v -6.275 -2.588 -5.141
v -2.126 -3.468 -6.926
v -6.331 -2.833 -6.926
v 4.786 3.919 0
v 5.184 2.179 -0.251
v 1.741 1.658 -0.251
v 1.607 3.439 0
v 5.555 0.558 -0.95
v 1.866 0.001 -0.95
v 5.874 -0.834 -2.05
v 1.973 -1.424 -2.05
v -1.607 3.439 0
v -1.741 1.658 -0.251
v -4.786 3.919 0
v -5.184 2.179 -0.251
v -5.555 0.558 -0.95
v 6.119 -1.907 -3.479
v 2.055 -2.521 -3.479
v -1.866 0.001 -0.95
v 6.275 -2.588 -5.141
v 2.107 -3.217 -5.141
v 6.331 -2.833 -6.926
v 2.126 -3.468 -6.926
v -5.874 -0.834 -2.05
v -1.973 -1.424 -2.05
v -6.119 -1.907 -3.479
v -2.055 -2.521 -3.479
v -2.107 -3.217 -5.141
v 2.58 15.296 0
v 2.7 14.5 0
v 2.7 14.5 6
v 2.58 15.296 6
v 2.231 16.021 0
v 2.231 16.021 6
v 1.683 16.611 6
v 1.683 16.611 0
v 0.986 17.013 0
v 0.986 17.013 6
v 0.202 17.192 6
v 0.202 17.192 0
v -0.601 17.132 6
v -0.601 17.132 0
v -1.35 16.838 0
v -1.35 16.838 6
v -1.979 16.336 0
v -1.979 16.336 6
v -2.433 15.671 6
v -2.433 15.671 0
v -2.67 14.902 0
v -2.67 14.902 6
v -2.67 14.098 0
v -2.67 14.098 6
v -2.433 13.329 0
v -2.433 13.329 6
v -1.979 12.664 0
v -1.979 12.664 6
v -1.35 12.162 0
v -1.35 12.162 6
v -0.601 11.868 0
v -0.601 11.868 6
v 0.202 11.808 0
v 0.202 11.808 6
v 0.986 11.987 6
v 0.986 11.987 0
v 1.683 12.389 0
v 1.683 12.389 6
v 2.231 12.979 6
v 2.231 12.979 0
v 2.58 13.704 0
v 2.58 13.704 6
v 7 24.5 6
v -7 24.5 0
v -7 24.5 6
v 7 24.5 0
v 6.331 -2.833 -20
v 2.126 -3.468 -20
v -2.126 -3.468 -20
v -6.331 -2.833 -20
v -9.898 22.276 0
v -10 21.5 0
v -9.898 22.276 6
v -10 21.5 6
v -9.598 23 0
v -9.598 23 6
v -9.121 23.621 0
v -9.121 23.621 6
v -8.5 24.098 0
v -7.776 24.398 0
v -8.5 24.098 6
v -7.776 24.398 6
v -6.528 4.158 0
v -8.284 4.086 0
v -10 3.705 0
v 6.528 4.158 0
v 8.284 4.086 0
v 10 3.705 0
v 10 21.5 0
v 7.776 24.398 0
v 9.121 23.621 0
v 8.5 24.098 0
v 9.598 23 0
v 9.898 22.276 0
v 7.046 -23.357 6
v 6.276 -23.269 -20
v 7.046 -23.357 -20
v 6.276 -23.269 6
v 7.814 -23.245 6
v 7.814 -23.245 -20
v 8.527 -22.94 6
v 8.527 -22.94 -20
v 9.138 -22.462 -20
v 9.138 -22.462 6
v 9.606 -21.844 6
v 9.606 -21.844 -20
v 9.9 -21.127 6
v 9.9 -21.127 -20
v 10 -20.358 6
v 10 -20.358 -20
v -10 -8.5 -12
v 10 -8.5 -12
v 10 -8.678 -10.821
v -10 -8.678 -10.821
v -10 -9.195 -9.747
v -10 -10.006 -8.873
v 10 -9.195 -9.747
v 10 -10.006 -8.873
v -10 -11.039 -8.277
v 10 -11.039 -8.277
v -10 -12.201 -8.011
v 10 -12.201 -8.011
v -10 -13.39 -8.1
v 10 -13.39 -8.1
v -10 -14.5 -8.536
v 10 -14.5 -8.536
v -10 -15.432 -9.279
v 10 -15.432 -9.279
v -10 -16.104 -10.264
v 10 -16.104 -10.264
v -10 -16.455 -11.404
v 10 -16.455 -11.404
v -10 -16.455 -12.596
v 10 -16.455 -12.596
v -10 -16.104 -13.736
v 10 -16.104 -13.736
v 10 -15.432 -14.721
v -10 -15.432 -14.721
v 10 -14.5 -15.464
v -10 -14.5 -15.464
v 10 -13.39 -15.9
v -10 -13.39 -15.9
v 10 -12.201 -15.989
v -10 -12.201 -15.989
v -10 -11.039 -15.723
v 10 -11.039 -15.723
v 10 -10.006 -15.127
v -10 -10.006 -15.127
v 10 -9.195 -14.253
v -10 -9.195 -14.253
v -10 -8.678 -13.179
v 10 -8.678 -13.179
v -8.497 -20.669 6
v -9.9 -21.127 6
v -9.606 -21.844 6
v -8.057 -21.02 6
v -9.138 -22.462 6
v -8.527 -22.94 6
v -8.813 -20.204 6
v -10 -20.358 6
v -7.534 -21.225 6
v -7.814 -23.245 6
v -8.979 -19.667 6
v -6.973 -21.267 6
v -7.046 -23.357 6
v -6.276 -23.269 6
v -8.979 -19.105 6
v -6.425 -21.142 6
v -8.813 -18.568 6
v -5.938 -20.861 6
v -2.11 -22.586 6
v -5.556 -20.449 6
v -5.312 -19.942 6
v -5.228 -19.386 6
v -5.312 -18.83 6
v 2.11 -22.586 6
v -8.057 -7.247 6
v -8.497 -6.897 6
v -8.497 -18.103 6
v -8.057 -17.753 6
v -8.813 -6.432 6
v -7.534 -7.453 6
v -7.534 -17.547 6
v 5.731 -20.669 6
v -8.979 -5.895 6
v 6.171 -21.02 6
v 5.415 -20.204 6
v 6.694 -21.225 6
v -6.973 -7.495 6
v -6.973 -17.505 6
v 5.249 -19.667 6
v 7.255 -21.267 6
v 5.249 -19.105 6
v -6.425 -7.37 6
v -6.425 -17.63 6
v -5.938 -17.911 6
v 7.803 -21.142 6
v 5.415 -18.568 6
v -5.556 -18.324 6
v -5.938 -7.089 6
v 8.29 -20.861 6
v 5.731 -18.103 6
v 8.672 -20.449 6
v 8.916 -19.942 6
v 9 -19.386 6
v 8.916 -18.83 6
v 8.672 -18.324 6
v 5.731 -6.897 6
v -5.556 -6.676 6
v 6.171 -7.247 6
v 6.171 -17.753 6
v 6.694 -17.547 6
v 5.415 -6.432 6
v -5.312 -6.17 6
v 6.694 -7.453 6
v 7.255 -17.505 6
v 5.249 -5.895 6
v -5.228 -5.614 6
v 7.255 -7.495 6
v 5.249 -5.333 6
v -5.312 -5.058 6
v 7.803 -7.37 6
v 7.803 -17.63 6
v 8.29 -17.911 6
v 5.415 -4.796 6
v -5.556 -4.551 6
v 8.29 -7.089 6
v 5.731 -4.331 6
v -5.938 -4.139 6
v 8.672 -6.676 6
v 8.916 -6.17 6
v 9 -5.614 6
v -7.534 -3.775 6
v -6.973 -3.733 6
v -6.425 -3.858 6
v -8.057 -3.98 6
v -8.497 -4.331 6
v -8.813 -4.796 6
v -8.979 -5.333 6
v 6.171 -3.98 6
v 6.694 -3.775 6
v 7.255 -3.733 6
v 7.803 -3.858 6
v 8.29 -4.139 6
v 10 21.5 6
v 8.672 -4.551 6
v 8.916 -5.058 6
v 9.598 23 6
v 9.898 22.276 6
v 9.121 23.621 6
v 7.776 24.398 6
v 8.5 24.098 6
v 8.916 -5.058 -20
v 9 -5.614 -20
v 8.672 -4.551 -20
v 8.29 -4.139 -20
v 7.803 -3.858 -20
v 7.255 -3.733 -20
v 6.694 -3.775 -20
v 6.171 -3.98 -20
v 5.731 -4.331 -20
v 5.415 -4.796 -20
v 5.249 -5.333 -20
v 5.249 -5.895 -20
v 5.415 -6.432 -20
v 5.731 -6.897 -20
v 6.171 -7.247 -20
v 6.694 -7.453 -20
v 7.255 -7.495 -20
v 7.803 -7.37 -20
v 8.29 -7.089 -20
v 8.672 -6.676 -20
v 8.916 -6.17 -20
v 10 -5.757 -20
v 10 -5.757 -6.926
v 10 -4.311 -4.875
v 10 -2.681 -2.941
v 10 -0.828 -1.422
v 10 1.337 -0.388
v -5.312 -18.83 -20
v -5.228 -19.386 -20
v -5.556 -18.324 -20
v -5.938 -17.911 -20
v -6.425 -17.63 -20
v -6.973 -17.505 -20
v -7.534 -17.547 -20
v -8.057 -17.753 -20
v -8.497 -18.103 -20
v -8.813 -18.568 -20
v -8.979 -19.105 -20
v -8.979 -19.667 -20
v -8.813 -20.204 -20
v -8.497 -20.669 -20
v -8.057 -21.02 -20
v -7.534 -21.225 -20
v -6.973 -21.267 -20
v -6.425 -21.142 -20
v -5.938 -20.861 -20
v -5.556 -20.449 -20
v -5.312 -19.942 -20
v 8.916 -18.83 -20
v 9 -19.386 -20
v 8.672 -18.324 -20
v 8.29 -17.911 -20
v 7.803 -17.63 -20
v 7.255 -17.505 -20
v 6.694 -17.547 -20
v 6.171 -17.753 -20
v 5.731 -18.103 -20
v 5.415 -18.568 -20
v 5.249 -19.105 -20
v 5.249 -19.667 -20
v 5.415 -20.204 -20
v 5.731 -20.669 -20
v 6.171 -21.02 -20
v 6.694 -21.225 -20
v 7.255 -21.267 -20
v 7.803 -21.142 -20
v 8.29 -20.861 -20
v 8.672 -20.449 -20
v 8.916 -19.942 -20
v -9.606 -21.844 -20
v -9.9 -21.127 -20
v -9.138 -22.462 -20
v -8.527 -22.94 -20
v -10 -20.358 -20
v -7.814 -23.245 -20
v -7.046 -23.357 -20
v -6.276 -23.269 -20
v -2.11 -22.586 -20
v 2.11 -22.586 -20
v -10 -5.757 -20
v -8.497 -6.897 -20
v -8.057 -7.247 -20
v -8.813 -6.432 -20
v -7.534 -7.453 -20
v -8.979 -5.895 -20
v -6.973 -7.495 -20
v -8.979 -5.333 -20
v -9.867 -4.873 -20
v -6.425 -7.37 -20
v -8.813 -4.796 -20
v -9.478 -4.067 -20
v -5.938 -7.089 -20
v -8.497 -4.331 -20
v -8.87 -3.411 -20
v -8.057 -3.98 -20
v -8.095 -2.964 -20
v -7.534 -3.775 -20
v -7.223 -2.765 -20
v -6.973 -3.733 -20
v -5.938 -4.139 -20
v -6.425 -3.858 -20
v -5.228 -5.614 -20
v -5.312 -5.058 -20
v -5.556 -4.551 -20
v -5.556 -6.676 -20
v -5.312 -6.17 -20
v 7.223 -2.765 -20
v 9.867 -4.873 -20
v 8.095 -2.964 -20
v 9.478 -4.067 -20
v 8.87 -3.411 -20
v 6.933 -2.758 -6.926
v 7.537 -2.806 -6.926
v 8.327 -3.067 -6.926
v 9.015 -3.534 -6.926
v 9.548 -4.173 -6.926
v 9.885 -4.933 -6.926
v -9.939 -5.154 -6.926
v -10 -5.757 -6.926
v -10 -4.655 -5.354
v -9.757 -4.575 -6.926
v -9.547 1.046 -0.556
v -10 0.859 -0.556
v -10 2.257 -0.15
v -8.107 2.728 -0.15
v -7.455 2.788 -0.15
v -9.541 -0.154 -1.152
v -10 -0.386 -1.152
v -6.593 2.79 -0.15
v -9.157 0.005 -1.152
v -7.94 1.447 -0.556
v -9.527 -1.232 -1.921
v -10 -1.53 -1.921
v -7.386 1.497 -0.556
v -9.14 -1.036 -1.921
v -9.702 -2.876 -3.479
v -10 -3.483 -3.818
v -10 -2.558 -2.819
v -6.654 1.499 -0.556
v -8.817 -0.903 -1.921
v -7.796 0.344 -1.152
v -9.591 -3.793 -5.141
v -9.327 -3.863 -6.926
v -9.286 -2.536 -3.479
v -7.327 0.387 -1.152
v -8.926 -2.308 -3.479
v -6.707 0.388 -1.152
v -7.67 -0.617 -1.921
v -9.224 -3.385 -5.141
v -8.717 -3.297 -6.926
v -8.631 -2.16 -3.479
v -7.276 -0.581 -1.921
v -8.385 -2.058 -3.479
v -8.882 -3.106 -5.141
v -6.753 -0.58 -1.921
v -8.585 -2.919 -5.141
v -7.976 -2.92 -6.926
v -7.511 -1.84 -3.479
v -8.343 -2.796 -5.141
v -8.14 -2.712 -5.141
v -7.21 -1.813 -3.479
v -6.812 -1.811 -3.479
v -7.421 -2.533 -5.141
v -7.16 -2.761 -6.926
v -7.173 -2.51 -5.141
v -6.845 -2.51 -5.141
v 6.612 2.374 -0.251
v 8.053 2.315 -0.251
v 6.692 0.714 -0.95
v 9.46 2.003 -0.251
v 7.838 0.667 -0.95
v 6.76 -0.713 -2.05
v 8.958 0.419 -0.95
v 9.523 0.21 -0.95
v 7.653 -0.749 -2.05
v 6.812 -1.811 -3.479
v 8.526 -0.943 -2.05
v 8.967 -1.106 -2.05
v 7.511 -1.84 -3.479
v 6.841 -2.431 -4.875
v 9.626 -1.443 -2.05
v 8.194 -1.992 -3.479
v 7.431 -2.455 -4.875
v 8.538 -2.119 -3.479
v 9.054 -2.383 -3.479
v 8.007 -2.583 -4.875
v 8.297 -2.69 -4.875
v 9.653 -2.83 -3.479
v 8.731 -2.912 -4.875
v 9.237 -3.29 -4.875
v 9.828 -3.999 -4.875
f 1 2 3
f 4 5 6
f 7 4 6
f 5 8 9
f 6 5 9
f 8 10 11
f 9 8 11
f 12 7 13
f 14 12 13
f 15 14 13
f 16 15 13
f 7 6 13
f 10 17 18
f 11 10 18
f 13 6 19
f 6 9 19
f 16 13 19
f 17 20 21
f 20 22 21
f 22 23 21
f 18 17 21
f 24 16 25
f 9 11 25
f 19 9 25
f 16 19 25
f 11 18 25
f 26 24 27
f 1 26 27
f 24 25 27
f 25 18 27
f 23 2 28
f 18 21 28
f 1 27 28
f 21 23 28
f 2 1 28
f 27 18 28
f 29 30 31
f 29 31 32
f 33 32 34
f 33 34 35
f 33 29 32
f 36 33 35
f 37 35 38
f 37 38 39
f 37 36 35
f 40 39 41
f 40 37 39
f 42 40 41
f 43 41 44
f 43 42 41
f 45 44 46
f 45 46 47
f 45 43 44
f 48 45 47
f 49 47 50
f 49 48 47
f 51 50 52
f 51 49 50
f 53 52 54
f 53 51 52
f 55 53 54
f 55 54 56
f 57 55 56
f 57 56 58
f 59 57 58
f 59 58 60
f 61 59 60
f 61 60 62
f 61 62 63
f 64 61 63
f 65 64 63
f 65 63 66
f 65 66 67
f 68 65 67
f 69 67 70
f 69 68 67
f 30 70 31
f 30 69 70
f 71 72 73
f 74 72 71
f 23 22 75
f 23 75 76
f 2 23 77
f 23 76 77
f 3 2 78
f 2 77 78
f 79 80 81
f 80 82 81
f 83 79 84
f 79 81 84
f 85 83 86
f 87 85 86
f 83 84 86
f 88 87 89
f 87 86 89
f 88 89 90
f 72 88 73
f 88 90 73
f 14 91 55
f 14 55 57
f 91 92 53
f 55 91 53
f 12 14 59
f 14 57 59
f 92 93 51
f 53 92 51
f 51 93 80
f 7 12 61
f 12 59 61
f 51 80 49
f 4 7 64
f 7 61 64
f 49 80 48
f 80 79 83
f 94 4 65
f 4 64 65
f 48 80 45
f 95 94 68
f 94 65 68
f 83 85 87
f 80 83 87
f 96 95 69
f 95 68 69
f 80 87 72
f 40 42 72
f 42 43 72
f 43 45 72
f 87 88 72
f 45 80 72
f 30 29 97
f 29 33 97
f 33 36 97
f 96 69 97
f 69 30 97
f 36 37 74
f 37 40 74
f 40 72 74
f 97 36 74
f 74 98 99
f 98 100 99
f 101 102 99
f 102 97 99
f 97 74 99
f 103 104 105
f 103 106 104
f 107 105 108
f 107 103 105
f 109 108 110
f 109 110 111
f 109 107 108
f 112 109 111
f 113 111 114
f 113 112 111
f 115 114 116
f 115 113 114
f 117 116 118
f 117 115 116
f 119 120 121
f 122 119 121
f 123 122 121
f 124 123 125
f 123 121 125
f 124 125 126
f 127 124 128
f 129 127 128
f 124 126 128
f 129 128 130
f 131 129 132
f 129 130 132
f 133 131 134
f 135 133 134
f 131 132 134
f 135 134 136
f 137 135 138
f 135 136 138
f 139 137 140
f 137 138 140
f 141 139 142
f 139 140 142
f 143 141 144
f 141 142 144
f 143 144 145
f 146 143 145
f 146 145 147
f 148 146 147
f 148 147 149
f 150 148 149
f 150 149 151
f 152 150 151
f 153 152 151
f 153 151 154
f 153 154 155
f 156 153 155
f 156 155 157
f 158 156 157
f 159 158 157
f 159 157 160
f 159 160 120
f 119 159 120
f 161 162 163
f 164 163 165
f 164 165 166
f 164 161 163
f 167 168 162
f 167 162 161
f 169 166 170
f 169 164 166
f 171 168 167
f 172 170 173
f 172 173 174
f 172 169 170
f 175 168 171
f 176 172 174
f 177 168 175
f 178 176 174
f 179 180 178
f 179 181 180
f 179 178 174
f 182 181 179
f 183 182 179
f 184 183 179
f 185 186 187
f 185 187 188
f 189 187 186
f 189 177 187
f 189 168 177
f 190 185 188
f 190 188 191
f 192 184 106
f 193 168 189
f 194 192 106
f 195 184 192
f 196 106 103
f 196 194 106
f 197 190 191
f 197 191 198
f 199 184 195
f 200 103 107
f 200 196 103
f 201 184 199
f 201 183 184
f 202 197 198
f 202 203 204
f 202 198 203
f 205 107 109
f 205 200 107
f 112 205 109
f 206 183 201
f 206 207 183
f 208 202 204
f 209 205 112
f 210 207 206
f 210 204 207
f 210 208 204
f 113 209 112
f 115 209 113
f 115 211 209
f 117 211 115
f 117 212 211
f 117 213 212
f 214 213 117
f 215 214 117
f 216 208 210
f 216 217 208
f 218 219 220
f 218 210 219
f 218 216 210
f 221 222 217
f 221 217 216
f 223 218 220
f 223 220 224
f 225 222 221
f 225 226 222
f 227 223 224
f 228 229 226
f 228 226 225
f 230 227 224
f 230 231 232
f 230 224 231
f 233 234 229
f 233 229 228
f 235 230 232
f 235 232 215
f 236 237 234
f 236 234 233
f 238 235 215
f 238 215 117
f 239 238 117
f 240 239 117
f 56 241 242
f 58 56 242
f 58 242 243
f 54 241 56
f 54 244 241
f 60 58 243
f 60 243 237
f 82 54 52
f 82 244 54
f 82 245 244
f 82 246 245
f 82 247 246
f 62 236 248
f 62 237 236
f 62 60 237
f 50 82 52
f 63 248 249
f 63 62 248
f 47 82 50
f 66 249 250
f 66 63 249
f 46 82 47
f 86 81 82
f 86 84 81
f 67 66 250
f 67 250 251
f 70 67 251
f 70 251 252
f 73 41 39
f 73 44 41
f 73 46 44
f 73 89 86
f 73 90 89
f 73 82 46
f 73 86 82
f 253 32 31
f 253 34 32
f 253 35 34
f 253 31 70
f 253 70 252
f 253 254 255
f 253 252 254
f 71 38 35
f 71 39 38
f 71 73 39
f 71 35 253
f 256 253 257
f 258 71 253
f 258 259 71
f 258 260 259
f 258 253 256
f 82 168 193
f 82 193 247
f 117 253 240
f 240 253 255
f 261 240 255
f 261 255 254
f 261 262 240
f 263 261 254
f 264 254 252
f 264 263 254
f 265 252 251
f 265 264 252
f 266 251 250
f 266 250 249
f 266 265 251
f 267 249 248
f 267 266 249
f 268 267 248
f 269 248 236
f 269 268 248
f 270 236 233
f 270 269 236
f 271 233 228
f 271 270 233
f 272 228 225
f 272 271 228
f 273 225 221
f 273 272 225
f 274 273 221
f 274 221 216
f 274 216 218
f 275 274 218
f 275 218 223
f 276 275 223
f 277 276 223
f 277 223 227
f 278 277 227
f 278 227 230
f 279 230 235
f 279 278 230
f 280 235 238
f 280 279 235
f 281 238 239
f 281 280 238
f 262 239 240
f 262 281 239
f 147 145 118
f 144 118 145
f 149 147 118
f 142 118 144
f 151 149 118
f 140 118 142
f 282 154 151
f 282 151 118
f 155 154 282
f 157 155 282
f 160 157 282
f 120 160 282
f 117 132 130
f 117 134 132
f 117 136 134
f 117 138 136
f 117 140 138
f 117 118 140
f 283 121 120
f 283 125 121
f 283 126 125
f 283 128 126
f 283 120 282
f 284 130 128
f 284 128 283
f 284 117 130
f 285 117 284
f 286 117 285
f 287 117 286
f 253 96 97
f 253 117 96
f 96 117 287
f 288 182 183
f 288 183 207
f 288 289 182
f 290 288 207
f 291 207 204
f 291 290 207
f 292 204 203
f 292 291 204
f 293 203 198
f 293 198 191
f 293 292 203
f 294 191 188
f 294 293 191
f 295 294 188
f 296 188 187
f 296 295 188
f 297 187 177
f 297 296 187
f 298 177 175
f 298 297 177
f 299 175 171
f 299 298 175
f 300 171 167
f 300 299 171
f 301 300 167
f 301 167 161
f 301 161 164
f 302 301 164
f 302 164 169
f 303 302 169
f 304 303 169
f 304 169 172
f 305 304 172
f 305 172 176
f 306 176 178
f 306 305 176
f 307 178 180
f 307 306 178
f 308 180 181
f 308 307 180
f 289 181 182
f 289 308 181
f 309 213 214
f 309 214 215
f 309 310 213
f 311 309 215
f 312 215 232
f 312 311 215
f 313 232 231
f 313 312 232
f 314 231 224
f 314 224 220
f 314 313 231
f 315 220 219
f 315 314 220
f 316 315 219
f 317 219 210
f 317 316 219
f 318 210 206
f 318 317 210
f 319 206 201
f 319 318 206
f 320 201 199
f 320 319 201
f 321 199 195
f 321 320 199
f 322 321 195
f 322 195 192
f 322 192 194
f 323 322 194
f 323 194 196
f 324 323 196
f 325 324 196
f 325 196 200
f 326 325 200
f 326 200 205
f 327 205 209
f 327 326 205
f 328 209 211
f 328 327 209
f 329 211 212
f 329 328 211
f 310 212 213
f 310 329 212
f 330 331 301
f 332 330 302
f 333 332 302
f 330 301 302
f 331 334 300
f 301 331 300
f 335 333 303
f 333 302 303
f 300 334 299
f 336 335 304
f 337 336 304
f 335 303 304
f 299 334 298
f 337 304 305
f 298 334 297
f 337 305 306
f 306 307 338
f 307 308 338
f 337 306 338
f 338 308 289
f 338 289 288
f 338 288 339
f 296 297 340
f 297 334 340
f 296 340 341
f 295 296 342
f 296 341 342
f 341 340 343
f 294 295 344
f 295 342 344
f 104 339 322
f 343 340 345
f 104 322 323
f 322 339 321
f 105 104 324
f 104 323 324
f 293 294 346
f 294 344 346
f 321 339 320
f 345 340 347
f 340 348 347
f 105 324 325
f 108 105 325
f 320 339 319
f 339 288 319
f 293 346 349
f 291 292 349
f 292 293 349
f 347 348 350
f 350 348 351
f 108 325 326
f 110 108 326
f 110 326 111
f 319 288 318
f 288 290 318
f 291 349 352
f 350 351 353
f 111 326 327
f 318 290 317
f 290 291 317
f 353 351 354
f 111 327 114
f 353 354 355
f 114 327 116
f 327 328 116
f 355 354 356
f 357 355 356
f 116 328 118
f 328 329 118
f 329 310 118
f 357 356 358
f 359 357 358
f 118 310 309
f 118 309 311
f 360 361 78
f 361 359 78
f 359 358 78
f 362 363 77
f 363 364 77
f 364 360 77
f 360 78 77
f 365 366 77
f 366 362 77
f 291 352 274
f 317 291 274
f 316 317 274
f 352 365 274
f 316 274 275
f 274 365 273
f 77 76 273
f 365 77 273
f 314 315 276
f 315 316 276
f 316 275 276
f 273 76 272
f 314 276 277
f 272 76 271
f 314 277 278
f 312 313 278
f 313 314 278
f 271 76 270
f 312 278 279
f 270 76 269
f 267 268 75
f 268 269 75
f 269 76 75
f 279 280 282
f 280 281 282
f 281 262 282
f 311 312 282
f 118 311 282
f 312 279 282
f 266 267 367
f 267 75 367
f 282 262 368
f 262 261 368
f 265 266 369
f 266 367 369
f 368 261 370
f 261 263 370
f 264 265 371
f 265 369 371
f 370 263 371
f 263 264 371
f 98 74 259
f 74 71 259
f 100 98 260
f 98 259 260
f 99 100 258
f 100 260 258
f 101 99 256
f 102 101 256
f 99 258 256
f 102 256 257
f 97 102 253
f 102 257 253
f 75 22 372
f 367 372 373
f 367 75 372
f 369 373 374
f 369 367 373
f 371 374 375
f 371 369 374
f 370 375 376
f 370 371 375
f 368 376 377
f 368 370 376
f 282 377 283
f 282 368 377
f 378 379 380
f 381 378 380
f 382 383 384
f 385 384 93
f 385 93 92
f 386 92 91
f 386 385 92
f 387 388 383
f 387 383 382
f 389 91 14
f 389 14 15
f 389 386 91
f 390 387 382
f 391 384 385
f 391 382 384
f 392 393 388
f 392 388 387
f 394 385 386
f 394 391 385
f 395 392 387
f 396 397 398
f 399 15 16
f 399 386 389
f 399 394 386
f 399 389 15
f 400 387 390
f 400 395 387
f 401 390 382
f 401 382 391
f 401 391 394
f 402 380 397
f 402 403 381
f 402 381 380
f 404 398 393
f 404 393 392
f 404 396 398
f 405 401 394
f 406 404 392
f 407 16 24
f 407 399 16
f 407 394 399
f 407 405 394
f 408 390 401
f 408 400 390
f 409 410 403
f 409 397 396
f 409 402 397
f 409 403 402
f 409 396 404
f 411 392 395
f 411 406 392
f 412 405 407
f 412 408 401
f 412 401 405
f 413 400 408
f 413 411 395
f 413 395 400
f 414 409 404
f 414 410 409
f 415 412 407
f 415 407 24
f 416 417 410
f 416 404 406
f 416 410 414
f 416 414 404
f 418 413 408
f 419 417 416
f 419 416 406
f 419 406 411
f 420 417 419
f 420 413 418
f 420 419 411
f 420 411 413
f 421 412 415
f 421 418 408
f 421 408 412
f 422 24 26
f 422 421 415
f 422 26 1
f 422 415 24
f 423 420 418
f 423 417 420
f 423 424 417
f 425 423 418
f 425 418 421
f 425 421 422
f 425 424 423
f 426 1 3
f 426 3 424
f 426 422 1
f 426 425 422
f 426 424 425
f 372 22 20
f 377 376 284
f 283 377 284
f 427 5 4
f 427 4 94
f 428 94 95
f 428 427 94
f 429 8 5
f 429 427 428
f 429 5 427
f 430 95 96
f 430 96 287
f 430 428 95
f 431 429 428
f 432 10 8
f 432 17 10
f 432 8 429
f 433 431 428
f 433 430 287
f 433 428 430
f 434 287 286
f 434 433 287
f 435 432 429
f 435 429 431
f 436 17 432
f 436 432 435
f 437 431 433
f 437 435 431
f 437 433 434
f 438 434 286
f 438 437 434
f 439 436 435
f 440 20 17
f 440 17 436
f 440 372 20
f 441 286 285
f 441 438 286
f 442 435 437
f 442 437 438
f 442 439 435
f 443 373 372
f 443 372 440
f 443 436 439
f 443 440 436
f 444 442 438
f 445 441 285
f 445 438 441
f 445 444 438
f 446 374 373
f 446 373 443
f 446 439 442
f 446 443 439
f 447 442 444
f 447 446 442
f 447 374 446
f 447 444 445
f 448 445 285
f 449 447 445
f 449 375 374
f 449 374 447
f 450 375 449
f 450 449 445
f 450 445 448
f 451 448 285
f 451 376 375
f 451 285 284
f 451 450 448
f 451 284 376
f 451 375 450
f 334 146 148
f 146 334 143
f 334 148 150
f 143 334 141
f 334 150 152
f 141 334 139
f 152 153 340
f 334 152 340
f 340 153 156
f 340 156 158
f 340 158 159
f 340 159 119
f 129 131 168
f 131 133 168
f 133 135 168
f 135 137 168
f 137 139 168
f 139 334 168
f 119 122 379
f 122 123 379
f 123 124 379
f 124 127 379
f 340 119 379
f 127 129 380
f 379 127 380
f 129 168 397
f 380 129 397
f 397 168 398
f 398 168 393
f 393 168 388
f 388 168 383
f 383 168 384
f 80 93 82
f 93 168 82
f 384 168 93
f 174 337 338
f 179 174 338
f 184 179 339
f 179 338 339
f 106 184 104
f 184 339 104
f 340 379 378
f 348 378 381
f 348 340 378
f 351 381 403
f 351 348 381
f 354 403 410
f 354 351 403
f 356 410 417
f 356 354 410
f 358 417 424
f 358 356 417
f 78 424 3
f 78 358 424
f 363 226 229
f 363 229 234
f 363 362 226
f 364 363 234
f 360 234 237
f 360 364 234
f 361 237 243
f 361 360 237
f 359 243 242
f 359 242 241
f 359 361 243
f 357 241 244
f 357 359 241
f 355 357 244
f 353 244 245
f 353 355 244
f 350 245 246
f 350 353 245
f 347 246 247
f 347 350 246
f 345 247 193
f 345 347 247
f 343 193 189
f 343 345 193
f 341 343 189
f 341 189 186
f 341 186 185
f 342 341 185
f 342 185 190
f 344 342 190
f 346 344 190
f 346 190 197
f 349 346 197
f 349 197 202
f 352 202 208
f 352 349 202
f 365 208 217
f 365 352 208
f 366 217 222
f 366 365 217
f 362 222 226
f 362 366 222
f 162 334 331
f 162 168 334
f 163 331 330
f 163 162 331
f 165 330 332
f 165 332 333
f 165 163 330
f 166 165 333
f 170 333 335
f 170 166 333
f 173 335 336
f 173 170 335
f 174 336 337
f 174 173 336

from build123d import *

# Parameters (mm, degrees)
F0_W         = 20
F0_H         = 22.7722101178
F0_R         = 1.8861050589
F0_H_2       = 26.2277898822
F0_R_2       = 2.7
F1_DEPTH     = 6
F2_DEPTH     = 20
F3_R         = 4
F4_DEPTH     = 25
F6_DEPTH     = 20
F7_DEPTH     = 26.001
F8_R         = 3
F9_T2_ANGLE  = 25.7767353783
F9_T6_ANGLE  = 359.64
F9_T11_ANGLE = 359.64


# Not quite as in the source:
# - a fillet or chamfer that OpenCascade refuses, or shapes differently, is made with other operations: its cross-section is extruded or revolved along the edge and cut away or added


with BuildPart() as f1:
    # F0 (on Top) → F1 (new body)
    with BuildSketch(Plane.XY):
        with Locations((0, -13.1138949411)):
            Rectangle(F0_W, F0_H)
        with Locations((-7.1138949411, -19.3861050589)):
            Circle(F0_R, mode=Mode.SUBTRACT)
        with Locations((-7.1138949411, -5.6138949411)):
            Circle(F0_R, mode=Mode.SUBTRACT)
        with Locations((7.1138949411, -19.3861050589)):
            Circle(F0_R, mode=Mode.SUBTRACT)
        with Locations((7.1138949411, -5.6138949411)):
            Circle(F0_R, mode=Mode.SUBTRACT)
        with Locations((0, 11.3861050589)):
            Rectangle(F0_W, F0_H_2)
        with Locations((0, 14.5)):
            Circle(F0_R_2, mode=Mode.SUBTRACT)
    extrude(amount=F1_DEPTH)

    # F0 (on Top) → F2 (join)
    with BuildSketch(Plane.XY):
        with Locations((0, -13.1138949411)):
            Rectangle(F0_W, F0_H)
        with Locations((-7.1138949411, -19.3861050589)):
            Circle(F0_R, mode=Mode.SUBTRACT)
        with Locations((-7.1138949411, -5.6138949411)):
            Circle(F0_R, mode=Mode.SUBTRACT)
        with Locations((7.1138949411, -19.3861050589)):
            Circle(F0_R, mode=Mode.SUBTRACT)
        with Locations((7.1138949411, -5.6138949411)):
            Circle(F0_R, mode=Mode.SUBTRACT)
    extrude(amount=-F2_DEPTH)

    # F3 (on face) → F4 (cut)
    with BuildSketch(Plane.YZ.offset(10)):
        with Locations((-12.5, -12)):
            Circle(F3_R)
    extrude(amount=-F4_DEPTH, mode=Mode.SUBTRACT)

    # F5 (on face) → F6 (cut, through all)
    with BuildSketch(Plane(origin=(0, 0, -20), x_dir=(1, 0, 0), z_dir=(0, 0, -1))):
        with BuildLine():
            Line((-10, 1.7277898822), (10, 1.7277898822))
            ThreePointArc((10, 1.7277898822), (0, 3.5477721311), (-10, 1.7277898822))
        make_face()
    extrude(amount=-F6_DEPTH, mode=Mode.SUBTRACT)

    # F5 (on face) → F7 (cut, through all)
    with BuildSketch(Plane(origin=(0, 0, -20), x_dir=(1, 0, 0), z_dir=(0, 0, -1))):
        with BuildLine():
            ThreePointArc((-10, 24.5), (0, 22.5), (10, 24.5))
            Line((10, 24.5), (-10, 24.5))
        make_face()
    extrude(amount=-F7_DEPTH, mode=Mode.SUBTRACT)

    # F8
    f8_edges = [f1.edges().sort_by_distance(p)[0] for p in [
        (-10, 24.5, 3),
        (10, 24.5, 3),
        (10, -24.5, -7),
        (-10, -24.5, -7),
        (-10, -1.72779, -10),
        (10, -1.72779, -10),
    ]]
    fillet(f8_edges, radius=F8_R)

    # F9: fillet of radius 7 on 1 edges, made by hand

    # F9_s1 → F9_t2 (revolve)
    with BuildSketch(Plane(origin=(5.3999454097, 1.2355988362, 0), x_dir=(0, 0, 1), z_dir=(0.9748064988, 0.2230522133, 0))):
        with BuildLine():
            ThreePointArc((0.0004, -2.8275125891), (-2.0502525317, 2.1232005646), (-7.0009656854, 4.1738530963))
            Line((-7.0009656854, 4.1738530963), (-7.0009656854, 4.8739896648))
            ThreePointArc((-7.0009656854, 4.8739896648), (-3.5004828427, 4.8735896648), (0, 4.8735896648))
            Line((0, 4.8735896648), (0.7001365685, 4.1734530963))
            ThreePointArc((0.7001365685, 4.1734530963), (0.7001365685, 0.6729702536), (0.7005365685, -2.8275125891))
            Line((0.7005365685, -2.8275125891), (0.0004, -2.8275125891))
        make_face()
    revolve(axis=Axis((0, 24.8350144179, 0), (0, 0, -1)), revolution_arc=F9_T2_ANGLE)


with BuildPart() as f9_tool4:
    # F9_s5 → F9_t6 (revolve)
    with BuildSketch(Plane(origin=(5.3999454097, 1.2355988362, 0), x_dir=(0, 0, 1), z_dir=(-0.9748064988, -0.2230522133, 0))):
        with BuildLine():
            ThreePointArc((0.0004, 2.8275125891), (-2.0502525317, -2.1232005646), (-7.0009656854, -4.1738530963))
            Line((-7.0009656854, -4.1738530963), (-7.0009656854, -4.8739896648))
            ThreePointArc((-7.0009656854, -4.8739896648), (-3.5004828427, -4.8735896648), (0, -4.8735896648))
            Line((0, -4.8735896648), (0.7001365685, -4.1734530963))
            ThreePointArc((0.7001365685, -4.1734530963), (0.7001365685, -0.6729702536), (0.7005365685, 2.8275125891))
            Line((0.7005365685, 2.8275125891), (0.0004, 2.8275125891))
        make_face()
    revolve(axis=Axis((7, -5.757129861, 0), (0, 0, -1)), revolution_arc=F9_T6_ANGLE)

    split(bisect_by=Plane.YZ.offset(10), keep=Keep.BOTTOM)


with BuildPart() as f1_1:
    add(f1.part)

    # F9_t3: union F9_tool4
    add(f9_tool4.part)


with BuildPart() as f9_tool9:
    # F9_s10 → F9_t11 (revolve)
    with BuildSketch(Plane(origin=(-5.348096652, 1.2591487889, 0), x_dir=(0, 0, 1), z_dir=(-0.9733857878, 0.22917266, 0))):
        with BuildLine():
            ThreePointArc((0.0004, 2.79284868), (-2.0502525317, -2.1578644738), (-7.0009656854, -4.2085170055))
            Line((-7.0009656854, -4.2085170055), (-7.0009656854, -4.908653574))
            ThreePointArc((-7.0009656854, -4.908653574), (-3.5004828427, -4.908253574), (0, -4.908253574))
            Line((0, -4.908253574), (0.7001365685, -4.2081170055))
            ThreePointArc((0.7001365685, -4.2081170055), (0.7001365685, -0.7076341628), (0.7005365685, 2.79284868))
            Line((0.7005365685, 2.79284868), (0.0004, 2.79284868))
        make_face()
    revolve(axis=Axis((-7, -5.757129861, 0), (0, 0, -1)), revolution_arc=F9_T11_ANGLE)

    split(bisect_by=Plane.YZ.offset(-10), keep=Keep.TOP)


with BuildPart() as f1_2:
    add(f1_1.part)

    # F9_t8: union F9_tool9
    add(f9_tool9.part)


solid = f1_2.part
